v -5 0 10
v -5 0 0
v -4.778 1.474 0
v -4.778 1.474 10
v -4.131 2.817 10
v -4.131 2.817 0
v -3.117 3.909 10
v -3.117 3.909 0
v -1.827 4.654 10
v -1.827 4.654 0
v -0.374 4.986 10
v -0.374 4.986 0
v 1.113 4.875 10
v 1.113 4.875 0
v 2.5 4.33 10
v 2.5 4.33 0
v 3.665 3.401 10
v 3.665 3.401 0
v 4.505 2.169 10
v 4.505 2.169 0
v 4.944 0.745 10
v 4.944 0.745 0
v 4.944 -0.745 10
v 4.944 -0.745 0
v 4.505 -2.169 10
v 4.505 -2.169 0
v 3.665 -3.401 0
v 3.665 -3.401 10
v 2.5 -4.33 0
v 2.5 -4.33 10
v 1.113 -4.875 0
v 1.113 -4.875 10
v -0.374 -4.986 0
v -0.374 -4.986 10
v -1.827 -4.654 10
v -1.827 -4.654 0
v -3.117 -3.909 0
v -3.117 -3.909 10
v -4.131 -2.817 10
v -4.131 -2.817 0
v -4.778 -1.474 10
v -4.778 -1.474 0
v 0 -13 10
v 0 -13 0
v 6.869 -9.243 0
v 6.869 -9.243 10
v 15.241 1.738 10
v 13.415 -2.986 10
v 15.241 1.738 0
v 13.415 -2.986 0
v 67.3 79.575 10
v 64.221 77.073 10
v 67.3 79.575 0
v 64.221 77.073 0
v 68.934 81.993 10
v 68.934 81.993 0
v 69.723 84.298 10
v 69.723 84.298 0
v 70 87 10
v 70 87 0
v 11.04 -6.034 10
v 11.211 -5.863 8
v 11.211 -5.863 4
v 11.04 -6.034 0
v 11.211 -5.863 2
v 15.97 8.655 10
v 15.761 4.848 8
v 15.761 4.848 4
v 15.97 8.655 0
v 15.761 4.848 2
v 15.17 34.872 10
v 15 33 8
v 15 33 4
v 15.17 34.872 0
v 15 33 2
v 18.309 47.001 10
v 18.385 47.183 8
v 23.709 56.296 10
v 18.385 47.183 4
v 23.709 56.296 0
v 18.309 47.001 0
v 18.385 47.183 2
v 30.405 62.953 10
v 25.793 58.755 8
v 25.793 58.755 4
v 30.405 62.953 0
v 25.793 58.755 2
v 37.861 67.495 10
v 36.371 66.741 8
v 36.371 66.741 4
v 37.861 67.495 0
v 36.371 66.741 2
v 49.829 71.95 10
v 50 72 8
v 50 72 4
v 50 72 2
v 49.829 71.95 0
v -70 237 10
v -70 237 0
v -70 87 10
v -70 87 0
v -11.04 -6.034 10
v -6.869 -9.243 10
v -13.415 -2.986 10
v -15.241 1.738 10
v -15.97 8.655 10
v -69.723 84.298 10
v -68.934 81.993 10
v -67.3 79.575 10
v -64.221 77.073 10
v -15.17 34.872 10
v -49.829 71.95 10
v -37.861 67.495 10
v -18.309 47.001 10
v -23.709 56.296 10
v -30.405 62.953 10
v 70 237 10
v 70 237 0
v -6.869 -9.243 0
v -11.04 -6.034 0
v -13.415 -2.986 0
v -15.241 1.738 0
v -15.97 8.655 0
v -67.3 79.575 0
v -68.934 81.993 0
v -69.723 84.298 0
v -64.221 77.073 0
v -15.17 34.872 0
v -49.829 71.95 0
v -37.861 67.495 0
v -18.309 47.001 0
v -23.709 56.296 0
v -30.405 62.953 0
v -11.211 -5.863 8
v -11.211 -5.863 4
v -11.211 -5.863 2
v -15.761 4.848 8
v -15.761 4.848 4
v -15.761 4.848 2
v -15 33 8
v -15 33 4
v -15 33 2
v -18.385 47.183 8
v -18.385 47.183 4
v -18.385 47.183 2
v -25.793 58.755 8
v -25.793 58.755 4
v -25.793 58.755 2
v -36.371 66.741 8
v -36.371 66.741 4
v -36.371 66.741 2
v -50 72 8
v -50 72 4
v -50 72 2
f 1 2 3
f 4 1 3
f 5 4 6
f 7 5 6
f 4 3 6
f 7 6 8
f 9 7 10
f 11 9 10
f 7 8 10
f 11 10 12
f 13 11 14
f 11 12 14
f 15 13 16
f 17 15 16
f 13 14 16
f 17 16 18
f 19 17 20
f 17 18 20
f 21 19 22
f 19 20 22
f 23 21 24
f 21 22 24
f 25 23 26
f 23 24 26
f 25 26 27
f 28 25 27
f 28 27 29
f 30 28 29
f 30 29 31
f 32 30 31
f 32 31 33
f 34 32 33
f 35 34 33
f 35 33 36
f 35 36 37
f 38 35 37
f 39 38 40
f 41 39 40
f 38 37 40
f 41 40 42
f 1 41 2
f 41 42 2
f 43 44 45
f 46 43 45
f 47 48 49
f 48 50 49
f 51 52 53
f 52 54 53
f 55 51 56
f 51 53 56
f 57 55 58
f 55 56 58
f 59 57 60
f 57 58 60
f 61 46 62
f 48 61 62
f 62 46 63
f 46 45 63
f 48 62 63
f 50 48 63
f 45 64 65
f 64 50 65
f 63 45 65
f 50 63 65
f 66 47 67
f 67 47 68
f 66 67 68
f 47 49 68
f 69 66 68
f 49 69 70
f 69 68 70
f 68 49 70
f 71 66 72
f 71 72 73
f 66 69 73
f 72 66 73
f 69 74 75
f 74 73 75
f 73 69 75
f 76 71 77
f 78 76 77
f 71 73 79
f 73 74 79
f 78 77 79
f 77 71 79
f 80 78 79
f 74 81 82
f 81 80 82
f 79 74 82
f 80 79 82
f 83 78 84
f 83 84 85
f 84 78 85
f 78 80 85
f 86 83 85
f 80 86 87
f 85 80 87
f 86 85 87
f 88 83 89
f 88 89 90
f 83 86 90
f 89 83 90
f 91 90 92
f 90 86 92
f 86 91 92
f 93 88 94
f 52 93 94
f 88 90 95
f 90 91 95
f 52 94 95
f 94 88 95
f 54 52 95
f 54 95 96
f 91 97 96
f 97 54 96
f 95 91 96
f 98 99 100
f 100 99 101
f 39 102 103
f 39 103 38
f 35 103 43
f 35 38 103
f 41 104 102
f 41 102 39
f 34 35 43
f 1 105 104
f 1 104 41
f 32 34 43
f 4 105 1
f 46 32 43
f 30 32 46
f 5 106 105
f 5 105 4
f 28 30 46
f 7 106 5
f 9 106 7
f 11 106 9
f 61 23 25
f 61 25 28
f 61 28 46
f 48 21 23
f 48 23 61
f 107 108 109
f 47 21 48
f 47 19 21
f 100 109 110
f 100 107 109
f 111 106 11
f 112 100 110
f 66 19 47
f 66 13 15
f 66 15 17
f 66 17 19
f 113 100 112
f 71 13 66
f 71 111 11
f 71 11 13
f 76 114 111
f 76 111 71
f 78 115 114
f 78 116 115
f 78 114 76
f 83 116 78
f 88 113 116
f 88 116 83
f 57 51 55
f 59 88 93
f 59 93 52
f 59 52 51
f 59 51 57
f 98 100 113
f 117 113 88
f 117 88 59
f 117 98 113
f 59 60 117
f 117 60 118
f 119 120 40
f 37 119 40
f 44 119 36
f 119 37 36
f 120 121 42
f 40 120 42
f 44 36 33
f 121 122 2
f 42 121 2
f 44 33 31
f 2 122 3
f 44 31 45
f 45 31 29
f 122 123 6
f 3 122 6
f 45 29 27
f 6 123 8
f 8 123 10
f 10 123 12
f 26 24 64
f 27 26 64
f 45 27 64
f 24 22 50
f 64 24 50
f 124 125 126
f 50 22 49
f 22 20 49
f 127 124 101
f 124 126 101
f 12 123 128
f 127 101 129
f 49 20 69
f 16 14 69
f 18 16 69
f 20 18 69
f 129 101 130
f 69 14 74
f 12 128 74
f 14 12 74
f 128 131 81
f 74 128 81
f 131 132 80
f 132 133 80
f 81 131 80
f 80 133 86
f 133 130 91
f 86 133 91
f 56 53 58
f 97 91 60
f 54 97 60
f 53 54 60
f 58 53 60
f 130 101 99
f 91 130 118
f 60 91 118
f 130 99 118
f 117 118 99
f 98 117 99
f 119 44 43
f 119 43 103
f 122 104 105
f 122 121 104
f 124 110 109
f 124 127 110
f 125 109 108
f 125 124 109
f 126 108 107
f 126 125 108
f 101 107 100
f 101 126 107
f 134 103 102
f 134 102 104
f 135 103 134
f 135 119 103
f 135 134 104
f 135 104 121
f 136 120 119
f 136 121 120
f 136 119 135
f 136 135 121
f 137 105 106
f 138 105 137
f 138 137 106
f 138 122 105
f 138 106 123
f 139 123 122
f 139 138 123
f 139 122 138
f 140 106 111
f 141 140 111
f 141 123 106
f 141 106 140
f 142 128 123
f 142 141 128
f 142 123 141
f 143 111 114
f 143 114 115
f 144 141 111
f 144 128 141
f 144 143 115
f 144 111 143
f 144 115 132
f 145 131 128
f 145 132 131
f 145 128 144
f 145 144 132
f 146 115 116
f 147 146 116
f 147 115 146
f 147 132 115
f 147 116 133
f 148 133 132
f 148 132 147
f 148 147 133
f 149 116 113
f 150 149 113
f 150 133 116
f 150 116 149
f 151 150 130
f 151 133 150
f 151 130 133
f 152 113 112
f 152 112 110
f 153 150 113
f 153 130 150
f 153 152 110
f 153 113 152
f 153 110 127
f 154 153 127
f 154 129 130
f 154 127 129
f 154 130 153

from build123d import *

# Parameters (mm, degrees)
BOSS_EXTRUDE1_DEPTH = 10
SKETCH2_R           = 5
CUT_EXTRUDE1_DEPTH  = 10


with BuildPart() as part:
    # Sketch1 → Boss-Extrude1 (new body)
    with BuildSketch(Plane.XY):
        with BuildLine():
            Line((70, 87), (70, 237))
            Line((70, 237), (-70, 237))
            Line((-70, 237), (-70, 87))
            add(Edge.make_bspline(
                [(0, -13), (-4.605948028, -10.653982198), (-21.385528158, -2.10738257), (-9.908182864, 31.191471557), (-24.240732749, 61.889747712), (-47.857626179, 72.570821606), (-70, 76.647728673), (-70, 87)],
                knots=[0, 0, 0, 0, 0.050956587, 0.18563608, 0.29003014, 0.381689368, 0.470019459, 0.470019459, 0.470019459, 0.470019459], degree=3))
            add(Edge.make_bspline(
                [(0, -13), (4.605948028, -10.653982198), (21.385528158, -2.10738257), (9.908182864, 31.191471557), (24.240732749, 61.889747712), (47.857626179, 72.570821606), (70, 76.647728673), (70, 87)],
                knots=[0, 0, 0, 0, 0.050956587, 0.18563608, 0.29003014, 0.381689368, 0.470019459, 0.470019459, 0.470019459, 0.470019459], degree=3))
        make_face()
    extrude(amount=BOSS_EXTRUDE1_DEPTH)

    # Sketch2 → Cut-Extrude1 (cut)
    with BuildSketch(Plane(origin=(0, 0, 0), x_dir=(-1, 0, 0), z_dir=(0, 0, -1))):
        Circle(SKETCH2_R)
    extrude(amount=-CUT_EXTRUDE1_DEPTH, mode=Mode.SUBTRACT)


solid = part.part
